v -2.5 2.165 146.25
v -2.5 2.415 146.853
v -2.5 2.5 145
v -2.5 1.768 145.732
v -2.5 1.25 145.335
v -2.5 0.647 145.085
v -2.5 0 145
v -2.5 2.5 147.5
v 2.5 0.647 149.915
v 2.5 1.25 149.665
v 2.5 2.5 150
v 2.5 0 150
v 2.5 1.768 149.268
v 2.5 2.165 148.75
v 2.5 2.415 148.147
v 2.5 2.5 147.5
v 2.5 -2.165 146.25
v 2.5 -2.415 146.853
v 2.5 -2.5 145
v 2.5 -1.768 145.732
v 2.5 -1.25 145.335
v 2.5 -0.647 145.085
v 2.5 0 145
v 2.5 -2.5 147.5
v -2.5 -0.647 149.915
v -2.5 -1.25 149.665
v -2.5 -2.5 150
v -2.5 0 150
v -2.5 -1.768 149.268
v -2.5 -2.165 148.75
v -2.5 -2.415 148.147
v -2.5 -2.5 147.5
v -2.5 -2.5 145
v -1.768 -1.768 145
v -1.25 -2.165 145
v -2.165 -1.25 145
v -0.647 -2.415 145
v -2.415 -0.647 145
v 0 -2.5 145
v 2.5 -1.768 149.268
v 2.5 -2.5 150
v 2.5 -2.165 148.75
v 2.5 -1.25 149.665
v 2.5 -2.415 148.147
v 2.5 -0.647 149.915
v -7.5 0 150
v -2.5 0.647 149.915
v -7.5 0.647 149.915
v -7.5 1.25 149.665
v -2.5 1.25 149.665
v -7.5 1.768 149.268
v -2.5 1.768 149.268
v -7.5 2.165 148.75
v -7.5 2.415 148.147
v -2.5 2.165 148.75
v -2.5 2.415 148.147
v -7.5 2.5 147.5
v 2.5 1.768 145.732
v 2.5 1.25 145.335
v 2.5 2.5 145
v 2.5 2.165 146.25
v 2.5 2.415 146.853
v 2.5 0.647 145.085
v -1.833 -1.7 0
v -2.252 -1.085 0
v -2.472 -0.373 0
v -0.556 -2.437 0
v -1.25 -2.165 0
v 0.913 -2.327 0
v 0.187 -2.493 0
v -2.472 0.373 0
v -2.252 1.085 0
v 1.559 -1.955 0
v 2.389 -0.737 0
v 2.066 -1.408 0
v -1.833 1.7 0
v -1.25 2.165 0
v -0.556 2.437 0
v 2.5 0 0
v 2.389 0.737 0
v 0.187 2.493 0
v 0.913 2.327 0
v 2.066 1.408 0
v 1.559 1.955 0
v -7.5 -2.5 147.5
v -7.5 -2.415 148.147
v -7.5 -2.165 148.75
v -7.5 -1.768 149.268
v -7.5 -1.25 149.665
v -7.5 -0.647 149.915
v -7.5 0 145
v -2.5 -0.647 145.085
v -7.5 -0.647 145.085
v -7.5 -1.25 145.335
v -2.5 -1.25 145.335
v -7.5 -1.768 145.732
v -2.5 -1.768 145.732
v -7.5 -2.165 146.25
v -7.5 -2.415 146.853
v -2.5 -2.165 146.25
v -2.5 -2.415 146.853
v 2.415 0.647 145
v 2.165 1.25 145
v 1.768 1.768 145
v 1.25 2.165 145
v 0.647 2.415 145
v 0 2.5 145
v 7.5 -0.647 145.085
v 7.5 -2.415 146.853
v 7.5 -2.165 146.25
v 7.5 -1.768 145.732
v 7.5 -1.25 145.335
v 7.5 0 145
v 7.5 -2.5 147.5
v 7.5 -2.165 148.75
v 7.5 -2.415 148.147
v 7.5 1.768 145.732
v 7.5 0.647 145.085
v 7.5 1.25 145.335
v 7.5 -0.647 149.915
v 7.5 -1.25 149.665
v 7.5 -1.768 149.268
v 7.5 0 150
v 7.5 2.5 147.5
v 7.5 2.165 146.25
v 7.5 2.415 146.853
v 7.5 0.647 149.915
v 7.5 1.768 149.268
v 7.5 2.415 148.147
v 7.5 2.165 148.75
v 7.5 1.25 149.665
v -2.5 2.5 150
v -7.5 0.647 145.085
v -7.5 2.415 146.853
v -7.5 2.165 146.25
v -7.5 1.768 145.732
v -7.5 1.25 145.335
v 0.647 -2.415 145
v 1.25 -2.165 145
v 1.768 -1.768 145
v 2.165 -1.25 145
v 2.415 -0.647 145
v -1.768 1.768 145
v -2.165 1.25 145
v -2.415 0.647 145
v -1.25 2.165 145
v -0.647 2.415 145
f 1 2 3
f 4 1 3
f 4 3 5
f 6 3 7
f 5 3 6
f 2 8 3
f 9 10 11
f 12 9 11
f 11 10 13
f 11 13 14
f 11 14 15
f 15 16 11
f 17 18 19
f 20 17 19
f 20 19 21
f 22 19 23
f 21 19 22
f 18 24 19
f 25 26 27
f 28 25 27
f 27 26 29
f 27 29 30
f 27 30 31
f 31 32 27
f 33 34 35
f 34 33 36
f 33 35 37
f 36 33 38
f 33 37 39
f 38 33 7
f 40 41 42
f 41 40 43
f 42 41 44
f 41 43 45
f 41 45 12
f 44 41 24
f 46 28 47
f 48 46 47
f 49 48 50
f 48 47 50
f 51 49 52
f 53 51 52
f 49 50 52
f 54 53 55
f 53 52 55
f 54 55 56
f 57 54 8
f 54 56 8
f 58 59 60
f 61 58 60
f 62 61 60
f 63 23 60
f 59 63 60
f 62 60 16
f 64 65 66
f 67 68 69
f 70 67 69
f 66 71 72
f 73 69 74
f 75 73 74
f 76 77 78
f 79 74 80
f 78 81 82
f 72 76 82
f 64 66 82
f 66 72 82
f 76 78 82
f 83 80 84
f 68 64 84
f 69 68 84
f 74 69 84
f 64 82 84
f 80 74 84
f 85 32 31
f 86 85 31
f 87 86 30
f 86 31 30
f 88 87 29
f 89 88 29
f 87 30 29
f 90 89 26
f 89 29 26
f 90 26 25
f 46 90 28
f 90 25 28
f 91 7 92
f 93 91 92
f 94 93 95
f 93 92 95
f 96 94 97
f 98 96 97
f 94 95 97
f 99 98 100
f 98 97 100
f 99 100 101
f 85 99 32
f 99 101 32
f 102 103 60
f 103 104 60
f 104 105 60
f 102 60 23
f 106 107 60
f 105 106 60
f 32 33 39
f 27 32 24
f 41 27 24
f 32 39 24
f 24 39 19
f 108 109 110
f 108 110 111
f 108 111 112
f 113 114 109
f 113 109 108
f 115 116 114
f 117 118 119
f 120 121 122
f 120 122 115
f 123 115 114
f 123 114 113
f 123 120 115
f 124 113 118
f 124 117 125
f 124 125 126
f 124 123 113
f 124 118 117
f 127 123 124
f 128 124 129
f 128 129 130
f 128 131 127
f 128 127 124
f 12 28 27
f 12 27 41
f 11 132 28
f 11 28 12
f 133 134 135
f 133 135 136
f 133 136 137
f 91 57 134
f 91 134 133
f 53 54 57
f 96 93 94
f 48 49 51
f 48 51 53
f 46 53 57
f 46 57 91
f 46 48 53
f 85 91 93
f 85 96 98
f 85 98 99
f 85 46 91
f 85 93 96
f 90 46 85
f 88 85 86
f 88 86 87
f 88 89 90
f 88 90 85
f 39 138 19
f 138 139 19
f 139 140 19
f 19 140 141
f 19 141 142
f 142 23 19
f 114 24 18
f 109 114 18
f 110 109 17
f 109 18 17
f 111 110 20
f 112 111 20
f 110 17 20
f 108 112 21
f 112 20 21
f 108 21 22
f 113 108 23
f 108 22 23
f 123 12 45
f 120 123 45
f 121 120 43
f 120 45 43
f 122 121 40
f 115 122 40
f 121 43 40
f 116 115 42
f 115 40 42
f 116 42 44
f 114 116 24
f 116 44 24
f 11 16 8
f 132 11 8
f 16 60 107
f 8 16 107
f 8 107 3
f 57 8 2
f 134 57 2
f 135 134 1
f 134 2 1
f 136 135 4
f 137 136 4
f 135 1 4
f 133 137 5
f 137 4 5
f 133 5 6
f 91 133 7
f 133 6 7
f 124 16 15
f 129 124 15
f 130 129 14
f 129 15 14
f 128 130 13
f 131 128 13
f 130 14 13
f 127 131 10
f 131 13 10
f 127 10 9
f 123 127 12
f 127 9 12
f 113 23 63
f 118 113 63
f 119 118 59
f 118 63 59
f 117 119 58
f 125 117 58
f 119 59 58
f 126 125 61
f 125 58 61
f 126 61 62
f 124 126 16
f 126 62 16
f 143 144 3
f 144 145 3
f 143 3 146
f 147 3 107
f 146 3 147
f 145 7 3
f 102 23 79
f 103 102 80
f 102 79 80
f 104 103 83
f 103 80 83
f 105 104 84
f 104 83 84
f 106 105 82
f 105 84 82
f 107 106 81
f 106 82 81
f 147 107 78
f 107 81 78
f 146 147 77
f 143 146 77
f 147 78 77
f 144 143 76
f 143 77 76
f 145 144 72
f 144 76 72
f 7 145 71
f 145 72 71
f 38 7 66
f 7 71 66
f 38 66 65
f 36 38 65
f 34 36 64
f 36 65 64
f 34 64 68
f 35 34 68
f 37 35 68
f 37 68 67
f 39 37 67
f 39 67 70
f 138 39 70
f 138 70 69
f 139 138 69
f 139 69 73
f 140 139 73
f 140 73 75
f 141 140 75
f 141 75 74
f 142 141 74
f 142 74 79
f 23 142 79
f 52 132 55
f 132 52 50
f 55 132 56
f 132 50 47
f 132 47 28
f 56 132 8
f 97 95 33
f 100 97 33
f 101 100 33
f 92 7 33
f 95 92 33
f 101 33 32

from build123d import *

# Parameters (mm, degrees)
F0_R     = 2.5
F1_DEPTH = 145
F3_DEPTH = 5
F5_DEPTH = 5
F7_DEPTH = 5


with BuildPart() as f1:
    # F0 (on Top) → F1 (new body)
    with BuildSketch(Plane.XY):
        Circle(F0_R)
    extrude(amount=F1_DEPTH)

    # F2 (on face) → F3 (join)
    with BuildSketch(Plane.XY.offset(145)):
        with BuildLine():
            Line((2.5, 2.5), (0, 2.5))
            ThreePointArc((0, 2.5), (1.767766953, 1.767766953), (2.5, 0))
            Line((2.5, 0), (2.5, 2.5))
        make_face()
        with BuildLine():
            Line((2.5, -2.5), (2.5, 0))
            ThreePointArc((2.5, 0), (1.767766953, -1.767766953), (0, -2.5))
            Line((0, -2.5), (2.5, -2.5))
        make_face()
        with BuildLine():
            ThreePointArc((2.5, 0), (1.767766953, 1.767766953), (0, 2.5))
            ThreePointArc((0, 2.5), (-1.767766953, 1.767766953), (-2.5, 0))
            ThreePointArc((-2.5, 0), (-1.767766953, -1.767766953), (0, -2.5))
            ThreePointArc((0, -2.5), (1.767766953, -1.767766953), (2.5, 0))
        make_face()
        with BuildLine():
            Line((0, 2.5), (-2.5, 2.5))
            Line((-2.5, 2.5), (-2.5, 0))
            ThreePointArc((-2.5, 0), (-1.767766953, 1.767766953), (0, 2.5))
        make_face()
        with BuildLine():
            ThreePointArc((0, -2.5), (-1.767766953, -1.767766953), (-2.5, 0))
            Line((-2.5, 0), (-2.5, -2.5))
            Line((-2.5, -2.5), (0, -2.5))
        make_face()
    extrude(amount=F3_DEPTH)

    # F4 (on face) → F5 (join)
    with BuildSketch(Plane(origin=(-2.5, 0, 0), x_dir=(0, -1, 0), z_dir=(-1, 0, 0))):
        with BuildLine():
            ThreePointArc((-2.5, 147.5), (-1.767766953, 145.732233047), (0, 145))
            ThreePointArc((0, 145), (1.767766953, 145.732233047), (2.5, 147.5))
            ThreePointArc((2.5, 147.5), (1.767766953, 149.267766953), (0, 150))
            ThreePointArc((0, 150), (-1.767766953, 149.267766953), (-2.5, 147.5))
        make_face()
    extrude(amount=F5_DEPTH)

    # F6 (on face) → F7 (join)
    with BuildSketch(Plane.YZ.offset(2.5)):
        with BuildLine():
            ThreePointArc((-2.5, 147.5), (-1.767766953, 145.732233047), (0, 145))
            ThreePointArc((0, 145), (1.767766953, 145.732233047), (2.5, 147.5))
            ThreePointArc((2.5, 147.5), (1.767766953, 149.267766953), (0, 150))
            ThreePointArc((0, 150), (-1.767766953, 149.267766953), (-2.5, 147.5))
        make_face()
    extrude(amount=F7_DEPTH)


solid = f1.part
